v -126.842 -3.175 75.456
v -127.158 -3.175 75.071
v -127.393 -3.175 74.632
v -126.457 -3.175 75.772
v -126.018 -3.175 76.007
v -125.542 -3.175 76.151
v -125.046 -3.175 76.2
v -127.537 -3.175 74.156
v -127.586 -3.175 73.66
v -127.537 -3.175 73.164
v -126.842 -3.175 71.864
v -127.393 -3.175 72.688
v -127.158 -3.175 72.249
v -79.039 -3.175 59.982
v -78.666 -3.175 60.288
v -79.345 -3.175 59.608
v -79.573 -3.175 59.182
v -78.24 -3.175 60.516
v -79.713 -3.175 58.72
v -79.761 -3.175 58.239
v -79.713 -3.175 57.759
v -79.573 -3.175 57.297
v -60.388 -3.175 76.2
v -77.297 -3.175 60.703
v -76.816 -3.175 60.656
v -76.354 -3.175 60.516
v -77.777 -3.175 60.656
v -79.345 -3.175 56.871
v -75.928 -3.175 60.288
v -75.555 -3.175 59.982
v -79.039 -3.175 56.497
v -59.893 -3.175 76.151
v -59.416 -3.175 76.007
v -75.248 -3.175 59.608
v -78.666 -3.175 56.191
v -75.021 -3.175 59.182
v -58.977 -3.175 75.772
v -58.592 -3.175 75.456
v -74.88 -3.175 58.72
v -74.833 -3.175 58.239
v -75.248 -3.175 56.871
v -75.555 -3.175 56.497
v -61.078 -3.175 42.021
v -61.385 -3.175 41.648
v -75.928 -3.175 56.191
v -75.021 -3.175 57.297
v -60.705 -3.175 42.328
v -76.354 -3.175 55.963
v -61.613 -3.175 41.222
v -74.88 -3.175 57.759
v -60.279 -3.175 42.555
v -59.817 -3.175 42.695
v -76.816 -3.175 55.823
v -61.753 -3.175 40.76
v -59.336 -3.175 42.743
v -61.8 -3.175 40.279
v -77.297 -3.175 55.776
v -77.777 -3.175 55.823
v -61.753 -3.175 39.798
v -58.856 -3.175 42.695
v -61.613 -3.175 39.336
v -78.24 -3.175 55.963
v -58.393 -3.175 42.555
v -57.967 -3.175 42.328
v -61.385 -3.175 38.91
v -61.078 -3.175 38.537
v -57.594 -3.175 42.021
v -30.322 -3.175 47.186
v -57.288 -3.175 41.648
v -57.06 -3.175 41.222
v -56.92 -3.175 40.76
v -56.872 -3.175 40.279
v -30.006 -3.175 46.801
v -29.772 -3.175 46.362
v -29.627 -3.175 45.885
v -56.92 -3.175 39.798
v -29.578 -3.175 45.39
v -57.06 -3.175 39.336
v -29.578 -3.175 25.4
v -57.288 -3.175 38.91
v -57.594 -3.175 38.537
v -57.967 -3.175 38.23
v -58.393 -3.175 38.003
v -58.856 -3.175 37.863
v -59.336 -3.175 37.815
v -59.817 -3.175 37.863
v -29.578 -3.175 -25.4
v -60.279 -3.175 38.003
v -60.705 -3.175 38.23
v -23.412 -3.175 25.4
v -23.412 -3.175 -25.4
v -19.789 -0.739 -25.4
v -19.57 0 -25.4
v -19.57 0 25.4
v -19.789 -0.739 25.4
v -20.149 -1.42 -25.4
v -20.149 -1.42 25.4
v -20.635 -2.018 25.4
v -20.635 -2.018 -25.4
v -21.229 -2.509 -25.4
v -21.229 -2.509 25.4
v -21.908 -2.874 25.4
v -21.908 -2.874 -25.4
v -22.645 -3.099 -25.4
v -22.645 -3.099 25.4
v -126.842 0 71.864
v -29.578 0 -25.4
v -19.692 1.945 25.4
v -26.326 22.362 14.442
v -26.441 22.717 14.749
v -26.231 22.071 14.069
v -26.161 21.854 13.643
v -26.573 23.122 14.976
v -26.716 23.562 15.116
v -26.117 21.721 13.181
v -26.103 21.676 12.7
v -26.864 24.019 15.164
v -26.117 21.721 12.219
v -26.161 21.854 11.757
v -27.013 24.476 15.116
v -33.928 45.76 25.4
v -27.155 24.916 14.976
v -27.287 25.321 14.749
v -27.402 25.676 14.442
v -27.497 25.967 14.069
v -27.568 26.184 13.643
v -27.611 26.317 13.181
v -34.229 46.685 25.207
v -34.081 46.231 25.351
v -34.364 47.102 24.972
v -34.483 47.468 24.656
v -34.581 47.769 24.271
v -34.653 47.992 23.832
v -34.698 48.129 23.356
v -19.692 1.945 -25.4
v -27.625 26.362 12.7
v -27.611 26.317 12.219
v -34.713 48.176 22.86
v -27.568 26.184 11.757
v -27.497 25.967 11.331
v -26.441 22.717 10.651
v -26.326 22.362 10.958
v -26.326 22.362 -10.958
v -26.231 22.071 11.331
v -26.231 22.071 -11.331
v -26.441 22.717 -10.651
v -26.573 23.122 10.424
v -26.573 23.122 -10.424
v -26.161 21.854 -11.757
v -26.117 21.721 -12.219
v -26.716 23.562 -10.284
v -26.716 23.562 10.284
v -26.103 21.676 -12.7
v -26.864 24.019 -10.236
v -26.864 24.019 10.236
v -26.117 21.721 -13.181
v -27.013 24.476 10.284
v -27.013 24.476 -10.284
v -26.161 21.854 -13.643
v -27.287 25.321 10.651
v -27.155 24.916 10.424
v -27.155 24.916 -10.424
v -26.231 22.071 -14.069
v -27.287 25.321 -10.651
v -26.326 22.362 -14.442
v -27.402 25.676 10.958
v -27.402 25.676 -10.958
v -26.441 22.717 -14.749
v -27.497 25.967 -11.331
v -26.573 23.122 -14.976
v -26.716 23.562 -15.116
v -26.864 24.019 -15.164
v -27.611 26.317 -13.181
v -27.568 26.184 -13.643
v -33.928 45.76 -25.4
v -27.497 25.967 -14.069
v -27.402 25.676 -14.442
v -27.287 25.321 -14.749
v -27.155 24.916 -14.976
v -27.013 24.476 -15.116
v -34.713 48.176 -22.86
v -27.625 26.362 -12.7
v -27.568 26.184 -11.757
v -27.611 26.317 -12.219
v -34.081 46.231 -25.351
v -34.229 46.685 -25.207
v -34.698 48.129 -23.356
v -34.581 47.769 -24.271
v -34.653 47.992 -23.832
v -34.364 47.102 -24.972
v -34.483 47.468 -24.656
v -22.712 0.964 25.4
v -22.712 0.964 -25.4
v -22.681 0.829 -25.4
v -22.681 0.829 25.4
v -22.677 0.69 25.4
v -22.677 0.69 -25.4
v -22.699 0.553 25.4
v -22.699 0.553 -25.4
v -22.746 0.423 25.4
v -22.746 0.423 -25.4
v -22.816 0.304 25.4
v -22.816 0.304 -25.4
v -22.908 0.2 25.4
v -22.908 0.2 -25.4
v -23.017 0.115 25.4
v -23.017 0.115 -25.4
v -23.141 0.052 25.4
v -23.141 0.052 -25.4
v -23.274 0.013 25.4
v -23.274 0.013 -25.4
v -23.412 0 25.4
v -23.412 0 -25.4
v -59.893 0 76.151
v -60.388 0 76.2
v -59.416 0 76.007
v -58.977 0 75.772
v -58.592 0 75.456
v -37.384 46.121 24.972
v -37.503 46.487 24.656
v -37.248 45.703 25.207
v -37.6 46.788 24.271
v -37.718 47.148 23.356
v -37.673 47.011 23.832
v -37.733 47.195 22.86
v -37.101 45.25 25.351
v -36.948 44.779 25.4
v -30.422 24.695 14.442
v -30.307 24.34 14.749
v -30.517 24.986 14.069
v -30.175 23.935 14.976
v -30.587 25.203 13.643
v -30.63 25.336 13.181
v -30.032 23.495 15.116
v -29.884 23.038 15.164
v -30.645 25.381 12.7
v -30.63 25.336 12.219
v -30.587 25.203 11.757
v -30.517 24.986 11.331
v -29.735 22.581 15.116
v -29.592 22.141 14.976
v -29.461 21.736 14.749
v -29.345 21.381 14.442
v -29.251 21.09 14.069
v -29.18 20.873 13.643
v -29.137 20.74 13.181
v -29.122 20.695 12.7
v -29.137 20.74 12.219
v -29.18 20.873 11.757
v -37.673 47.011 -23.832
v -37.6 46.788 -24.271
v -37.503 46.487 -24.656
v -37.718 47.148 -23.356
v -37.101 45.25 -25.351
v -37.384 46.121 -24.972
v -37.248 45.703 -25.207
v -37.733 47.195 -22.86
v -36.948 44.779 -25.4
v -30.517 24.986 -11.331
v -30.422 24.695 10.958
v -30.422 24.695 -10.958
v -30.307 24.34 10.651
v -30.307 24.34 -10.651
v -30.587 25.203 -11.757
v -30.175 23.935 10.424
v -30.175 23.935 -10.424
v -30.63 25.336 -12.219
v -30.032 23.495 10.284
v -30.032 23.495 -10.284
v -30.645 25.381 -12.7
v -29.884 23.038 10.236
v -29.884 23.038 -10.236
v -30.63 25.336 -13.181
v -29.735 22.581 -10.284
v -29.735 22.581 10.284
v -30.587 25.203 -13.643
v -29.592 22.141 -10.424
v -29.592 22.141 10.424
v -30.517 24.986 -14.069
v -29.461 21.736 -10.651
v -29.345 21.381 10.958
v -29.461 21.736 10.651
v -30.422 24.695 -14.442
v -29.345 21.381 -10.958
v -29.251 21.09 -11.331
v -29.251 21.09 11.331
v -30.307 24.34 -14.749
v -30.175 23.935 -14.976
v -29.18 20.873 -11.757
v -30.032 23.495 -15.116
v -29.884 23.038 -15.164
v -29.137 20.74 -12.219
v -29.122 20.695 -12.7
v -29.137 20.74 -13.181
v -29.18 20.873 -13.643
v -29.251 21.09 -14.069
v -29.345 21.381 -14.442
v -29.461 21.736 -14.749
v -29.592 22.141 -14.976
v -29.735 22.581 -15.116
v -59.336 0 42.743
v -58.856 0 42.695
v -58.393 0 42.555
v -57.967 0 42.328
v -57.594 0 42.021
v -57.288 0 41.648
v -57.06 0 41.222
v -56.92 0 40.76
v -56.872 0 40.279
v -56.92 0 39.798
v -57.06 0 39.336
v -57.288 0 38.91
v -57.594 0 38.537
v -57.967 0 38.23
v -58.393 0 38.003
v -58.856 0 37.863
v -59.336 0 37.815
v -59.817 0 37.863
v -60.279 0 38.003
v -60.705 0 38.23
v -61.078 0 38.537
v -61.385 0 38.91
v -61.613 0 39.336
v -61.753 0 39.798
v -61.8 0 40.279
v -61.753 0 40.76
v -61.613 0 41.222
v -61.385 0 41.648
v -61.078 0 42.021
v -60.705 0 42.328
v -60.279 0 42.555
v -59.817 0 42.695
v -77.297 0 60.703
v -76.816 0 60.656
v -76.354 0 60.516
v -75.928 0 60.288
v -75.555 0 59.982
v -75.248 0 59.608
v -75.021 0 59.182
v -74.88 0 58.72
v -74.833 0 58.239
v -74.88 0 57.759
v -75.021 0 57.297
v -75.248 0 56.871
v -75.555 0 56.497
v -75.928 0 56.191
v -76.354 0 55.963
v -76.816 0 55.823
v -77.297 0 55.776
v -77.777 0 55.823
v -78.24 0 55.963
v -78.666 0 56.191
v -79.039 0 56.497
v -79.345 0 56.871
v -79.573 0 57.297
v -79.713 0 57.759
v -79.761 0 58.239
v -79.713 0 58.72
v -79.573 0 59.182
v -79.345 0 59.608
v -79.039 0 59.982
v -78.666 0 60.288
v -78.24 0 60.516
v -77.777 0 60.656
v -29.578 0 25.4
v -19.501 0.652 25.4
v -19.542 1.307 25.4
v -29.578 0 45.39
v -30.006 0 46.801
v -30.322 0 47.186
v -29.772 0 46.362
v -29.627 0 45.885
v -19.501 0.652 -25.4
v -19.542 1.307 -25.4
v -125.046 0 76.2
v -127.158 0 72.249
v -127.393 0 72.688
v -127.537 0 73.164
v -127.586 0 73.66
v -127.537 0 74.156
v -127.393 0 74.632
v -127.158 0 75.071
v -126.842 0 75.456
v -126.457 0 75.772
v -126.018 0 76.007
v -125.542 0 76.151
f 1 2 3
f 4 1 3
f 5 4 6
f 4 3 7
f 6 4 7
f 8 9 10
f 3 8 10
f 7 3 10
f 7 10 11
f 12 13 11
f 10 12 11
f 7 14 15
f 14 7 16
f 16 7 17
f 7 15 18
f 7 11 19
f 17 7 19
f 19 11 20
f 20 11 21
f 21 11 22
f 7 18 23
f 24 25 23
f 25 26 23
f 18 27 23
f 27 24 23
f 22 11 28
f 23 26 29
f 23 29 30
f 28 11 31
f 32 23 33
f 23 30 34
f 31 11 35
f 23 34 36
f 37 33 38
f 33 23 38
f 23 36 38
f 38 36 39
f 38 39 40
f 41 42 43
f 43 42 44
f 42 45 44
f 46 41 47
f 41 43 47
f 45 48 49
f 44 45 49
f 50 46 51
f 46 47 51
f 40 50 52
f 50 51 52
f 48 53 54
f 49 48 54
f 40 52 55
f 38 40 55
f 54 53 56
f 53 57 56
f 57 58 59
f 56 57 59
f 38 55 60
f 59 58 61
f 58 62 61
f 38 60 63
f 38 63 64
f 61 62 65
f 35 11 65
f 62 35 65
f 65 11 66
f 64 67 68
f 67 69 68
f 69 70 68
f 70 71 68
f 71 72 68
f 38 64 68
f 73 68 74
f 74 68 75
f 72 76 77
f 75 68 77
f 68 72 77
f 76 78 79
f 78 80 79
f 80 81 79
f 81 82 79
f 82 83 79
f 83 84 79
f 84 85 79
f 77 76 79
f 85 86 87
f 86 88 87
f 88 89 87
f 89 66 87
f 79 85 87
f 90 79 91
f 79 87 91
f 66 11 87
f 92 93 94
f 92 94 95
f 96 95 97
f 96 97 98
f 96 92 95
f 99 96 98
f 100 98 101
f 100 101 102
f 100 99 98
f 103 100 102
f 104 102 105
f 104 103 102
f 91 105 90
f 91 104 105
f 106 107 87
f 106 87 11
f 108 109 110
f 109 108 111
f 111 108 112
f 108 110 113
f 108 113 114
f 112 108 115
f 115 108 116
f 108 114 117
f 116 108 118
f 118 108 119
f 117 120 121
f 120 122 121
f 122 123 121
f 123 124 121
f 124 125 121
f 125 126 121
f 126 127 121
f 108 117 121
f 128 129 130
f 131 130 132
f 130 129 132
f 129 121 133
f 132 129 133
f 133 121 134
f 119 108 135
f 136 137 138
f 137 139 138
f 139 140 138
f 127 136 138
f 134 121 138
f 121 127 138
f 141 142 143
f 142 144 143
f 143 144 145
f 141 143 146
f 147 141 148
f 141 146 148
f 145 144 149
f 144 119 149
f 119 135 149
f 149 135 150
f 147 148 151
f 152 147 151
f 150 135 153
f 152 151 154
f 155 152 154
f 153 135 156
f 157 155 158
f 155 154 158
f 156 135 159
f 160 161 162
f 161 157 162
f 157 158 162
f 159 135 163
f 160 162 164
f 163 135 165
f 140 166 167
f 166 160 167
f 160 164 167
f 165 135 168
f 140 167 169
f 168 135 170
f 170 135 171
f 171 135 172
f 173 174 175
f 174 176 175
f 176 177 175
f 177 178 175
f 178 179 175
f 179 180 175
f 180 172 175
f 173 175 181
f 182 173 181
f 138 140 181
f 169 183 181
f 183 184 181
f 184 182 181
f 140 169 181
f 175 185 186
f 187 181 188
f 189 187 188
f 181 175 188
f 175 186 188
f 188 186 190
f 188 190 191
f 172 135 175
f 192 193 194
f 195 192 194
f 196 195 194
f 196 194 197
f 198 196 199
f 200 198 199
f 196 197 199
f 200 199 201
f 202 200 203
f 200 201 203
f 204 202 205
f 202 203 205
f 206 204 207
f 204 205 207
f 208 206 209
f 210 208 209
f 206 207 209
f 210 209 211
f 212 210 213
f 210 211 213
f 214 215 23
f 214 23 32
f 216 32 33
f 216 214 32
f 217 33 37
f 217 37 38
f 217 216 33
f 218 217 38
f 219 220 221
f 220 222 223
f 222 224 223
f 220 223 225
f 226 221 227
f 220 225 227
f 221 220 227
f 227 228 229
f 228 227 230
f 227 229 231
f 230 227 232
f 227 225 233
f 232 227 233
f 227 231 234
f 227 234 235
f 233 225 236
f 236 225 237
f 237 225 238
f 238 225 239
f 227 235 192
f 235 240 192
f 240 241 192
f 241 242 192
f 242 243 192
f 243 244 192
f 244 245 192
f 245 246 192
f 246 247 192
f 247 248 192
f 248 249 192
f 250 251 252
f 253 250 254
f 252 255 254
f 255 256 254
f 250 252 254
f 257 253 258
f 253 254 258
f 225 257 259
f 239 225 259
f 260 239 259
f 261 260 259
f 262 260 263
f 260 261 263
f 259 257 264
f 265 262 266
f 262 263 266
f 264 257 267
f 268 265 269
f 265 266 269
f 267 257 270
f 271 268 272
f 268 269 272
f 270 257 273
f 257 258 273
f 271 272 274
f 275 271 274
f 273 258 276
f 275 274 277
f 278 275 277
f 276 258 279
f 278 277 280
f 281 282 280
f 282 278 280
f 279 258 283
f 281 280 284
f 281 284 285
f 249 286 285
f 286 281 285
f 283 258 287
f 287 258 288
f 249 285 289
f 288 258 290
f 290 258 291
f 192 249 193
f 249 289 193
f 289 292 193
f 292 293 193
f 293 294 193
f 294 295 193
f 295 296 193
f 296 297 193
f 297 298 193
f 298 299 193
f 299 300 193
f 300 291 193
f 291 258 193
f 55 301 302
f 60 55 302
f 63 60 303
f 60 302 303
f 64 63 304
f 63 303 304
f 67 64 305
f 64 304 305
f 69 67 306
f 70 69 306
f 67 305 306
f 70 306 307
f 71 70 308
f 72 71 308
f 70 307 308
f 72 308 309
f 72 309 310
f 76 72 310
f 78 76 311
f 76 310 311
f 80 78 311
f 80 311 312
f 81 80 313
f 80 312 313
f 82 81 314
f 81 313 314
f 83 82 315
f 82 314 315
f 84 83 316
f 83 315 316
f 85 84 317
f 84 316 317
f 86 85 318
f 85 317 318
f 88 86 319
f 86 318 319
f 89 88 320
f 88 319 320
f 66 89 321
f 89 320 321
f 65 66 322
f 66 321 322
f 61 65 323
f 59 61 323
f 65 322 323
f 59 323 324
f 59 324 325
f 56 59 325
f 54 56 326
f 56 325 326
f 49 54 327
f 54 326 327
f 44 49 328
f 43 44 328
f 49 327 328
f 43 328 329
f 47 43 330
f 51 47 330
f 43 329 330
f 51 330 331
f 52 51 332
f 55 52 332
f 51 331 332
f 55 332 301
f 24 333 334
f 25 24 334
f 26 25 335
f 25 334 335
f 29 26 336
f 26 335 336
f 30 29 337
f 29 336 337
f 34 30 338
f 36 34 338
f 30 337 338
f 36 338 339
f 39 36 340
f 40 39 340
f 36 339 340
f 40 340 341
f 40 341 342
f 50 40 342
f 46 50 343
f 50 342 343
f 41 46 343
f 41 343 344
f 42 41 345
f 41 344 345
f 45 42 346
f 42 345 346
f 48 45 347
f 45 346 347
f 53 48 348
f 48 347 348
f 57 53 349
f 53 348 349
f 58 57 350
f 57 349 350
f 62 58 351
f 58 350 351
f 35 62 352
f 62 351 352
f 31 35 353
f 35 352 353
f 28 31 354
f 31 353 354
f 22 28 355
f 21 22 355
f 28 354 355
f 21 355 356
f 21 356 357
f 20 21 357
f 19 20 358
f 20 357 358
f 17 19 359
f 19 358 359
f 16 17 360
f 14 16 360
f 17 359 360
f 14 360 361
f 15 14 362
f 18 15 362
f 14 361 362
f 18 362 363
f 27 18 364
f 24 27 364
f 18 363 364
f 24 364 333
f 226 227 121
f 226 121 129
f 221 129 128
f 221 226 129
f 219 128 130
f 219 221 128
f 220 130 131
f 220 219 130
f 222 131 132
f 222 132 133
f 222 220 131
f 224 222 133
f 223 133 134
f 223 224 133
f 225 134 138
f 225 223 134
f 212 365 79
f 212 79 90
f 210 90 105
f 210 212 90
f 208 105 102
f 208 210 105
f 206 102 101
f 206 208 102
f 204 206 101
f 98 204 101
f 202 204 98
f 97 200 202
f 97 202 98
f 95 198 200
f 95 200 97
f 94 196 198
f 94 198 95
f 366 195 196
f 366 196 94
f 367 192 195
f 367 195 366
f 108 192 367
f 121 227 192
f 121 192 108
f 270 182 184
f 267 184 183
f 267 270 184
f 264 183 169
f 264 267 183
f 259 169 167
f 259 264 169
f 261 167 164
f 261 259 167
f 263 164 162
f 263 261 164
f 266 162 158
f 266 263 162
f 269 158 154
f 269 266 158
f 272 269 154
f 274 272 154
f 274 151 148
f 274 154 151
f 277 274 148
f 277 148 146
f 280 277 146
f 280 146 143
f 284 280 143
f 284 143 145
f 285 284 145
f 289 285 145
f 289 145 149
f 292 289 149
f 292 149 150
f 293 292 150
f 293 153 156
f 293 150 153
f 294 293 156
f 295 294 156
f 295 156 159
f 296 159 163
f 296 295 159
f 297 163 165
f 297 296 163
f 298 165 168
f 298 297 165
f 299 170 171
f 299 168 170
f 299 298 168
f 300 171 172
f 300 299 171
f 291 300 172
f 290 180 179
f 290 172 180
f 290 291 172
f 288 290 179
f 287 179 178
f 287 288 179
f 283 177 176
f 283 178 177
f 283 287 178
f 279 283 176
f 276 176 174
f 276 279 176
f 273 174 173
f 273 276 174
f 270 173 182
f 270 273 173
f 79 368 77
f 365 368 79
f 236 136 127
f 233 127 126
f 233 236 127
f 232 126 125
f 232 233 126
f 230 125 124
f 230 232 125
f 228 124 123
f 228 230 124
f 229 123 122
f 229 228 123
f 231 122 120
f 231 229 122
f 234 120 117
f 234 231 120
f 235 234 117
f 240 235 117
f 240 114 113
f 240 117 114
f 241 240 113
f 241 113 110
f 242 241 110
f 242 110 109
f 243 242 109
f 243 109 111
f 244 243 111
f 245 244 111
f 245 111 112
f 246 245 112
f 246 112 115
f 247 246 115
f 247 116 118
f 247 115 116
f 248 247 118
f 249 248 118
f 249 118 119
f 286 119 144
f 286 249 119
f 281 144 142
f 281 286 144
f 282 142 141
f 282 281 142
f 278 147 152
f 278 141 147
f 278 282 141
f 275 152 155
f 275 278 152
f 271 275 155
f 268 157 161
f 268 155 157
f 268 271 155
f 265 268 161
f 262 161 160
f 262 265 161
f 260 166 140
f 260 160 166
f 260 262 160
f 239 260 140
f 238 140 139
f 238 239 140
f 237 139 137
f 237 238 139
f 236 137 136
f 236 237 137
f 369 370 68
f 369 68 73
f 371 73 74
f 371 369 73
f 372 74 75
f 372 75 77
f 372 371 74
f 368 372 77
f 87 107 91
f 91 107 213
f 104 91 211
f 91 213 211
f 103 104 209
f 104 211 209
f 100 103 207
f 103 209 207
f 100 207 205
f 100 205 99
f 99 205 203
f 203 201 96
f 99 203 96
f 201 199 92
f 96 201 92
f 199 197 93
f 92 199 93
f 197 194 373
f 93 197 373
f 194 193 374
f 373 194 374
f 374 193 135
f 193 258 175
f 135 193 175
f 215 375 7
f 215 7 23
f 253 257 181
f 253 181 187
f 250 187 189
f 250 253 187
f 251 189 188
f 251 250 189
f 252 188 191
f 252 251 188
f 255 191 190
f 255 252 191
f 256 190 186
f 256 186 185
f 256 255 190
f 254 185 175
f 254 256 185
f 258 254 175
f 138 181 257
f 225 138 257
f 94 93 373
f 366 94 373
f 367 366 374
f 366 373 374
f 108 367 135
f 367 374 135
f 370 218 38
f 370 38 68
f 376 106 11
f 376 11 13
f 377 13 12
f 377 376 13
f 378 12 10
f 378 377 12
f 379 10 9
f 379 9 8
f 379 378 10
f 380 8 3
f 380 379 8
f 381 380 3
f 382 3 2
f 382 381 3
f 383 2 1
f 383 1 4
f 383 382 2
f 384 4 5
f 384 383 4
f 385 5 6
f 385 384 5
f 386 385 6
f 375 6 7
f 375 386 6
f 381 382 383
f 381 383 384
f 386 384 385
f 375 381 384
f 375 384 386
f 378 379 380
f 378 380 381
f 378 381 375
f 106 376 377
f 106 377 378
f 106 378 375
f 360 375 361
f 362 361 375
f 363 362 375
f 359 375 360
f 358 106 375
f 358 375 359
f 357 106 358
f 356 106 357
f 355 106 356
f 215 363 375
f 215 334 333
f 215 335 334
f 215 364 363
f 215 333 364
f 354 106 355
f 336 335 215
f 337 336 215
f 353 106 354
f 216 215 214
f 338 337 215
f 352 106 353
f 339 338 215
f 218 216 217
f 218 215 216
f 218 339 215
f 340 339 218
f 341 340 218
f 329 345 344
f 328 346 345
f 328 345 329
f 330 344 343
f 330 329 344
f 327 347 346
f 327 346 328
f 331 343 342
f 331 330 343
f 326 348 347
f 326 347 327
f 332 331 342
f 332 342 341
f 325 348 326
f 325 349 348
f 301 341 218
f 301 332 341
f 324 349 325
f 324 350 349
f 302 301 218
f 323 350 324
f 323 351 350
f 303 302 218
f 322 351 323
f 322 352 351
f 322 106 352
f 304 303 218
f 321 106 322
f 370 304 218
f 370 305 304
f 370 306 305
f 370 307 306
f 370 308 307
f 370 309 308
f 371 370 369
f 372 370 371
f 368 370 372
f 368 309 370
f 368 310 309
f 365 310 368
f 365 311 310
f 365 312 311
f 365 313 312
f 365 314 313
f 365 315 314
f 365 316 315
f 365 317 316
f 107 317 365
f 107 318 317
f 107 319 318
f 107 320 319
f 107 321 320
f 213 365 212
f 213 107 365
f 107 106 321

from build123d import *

# Parameters (mm, degrees)
SKETCH1_R                  = 2.4638
BASE_FLANGE1_DEPTH         = 3.175
SKETCHED_START             = -25.4
SKETCHED_BEND1_DEPTH       = 50.8
SKETCHED_START_2           = -10.2361999
SKETCHED_BEND1_2_DEPTH     = 20.4723998
SKETCHED_START_3           = -22.86
SKETCHED_BEND1_3_DEPTH     = 7.6961999
SKETCHED_START_4           = 15.1638001
SKETCHED_BEND1_4_DEPTH     = 7.6961999
SKETCHED_BEND1_5_DEPTH     = 50.8
SKETCHED_START_5           = -21.302020374
SKETCHED_BEND1_6_OUTLINE_R = 2.4638
SKETCHED_BEND1_6_DEPTH     = 4.302020374


with BuildPart() as part:
    # Base-Flange1: sheet metal written as solids
    # Sketch1 → Base-Flange1 (new body)
    with BuildSketch(Plane(origin=(0, 0, 0), x_dir=(1, 0, 0), z_dir=(0, 1, 0))):
        with BuildLine():
            Line((-29.5783, 25.4), (-126.842248776, -71.863948776))
            ThreePointArc((-126.842248776, -71.863948776), (-127.392851564, -74.632015918), (-125.046197552, -76.2))
            Line((-125.046197552, -76.2), (-60.38835348, -76.2))
            ThreePointArc((-60.38835348, -76.2), (-59.416337562, -76.006654013), (-58.592302256, -75.456051224))
            Line((-58.592302256, -75.456051224), (-30.322248776, -47.185997744))
            ThreePointArc((-30.322248776, -47.185997744), (-29.771645987, -46.361962438), (-29.5783, -45.38994652))
            Line((-29.5783, -45.38994652), (-29.5783, -25.4))
            Line((-29.5783, -25.4), (27.0383, -25.4))
            ThreePointArc((27.0383, -25.4), (28.834351224, -24.656051224), (29.5783, -22.86))
            Line((29.5783, -22.86), (29.5783, 22.86))
            ThreePointArc((29.5783, 22.86), (28.834351224, 24.656051224), (27.0383, 25.4))
            Line((27.0383, 25.4), (-29.5783, 25.4))
        make_face()
        with Locations(Location((-77.296763274, -58.239487758, 0), (0, 0, 270))):
            Circle(SKETCH1_R, mode=Mode.SUBTRACT)
        with Locations(Location((-59.336251031, -40.278975516, 0), (0, 0, 270))):
            Circle(SKETCH1_R, mode=Mode.SUBTRACT)
        with Locations(Location((4.1783, -12.7, 0), (0, 0, 270))):
            Circle(SKETCH1_R, mode=Mode.SUBTRACT)
        with Locations(Location((4.1783, 12.7, 0), (0, 0, 270))):
            Circle(SKETCH1_R, mode=Mode.SUBTRACT)
    extrude(amount=-BASE_FLANGE1_DEPTH)

    # Sketched Bend1: read off the stored shape, not the designer's step
    # Sketched Bend1 outline → Sketched Bend1 (cut)
    with BuildSketch(Plane.XY.offset(SKETCHED_START)):
        with BuildLine():
            Line((29.5783, 0), (-19.570493847, 0))
            ThreePointArc((-19.570493847, 0), (-20.920192704, -2.278520157), (-23.412112646, -3.175))
            Line((-23.412112646, -3.175), (29.5783, -3.175))
            Line((29.5783, -3.175), (29.5783, 0))
        make_face()
    extrude(amount=SKETCHED_BEND1_DEPTH, mode=Mode.SUBTRACT)

    # Sketched Bend1 2 outline → Sketched Bend1 2 (add)
    with BuildSketch(Plane.XY.offset(SKETCHED_START_2)):
        with BuildLine():
            ThreePointArc((-19.570493847, 0), (-19.508115407, 0.98036242), (-19.691959977, 1.945350875))
            Line((-19.691959977, 1.945350875), (-34.713148559, 48.175815683))
            Line((-34.713148559, 48.175815683), (-37.732752998, 47.194686726))
            Line((-37.732752998, 47.194686726), (-22.711564416, 0.964221918))
            ThreePointArc((-22.711564416, 0.964221918), (-22.816190728, 0.303637383), (-23.412112646, 0))
            Line((-23.412112646, 0), (-19.570493847, 0))
        make_face()
    extrude(amount=SKETCHED_BEND1_2_DEPTH)

    # Sketched Bend1 3 outline → Sketched Bend1 3 (add)
    with BuildSketch(Plane.XY.offset(SKETCHED_START_3)):
        with BuildLine():
            ThreePointArc((-19.570493847, 0), (-19.508115407, 0.98036242), (-19.691959977, 1.945350875))
            Line((-19.691959977, 1.945350875), (-34.713148559, 48.175815683))
            Line((-34.713148559, 48.175815683), (-37.732752998, 47.194686726))
            Line((-37.732752998, 47.194686726), (-22.711564416, 0.964221918))
            ThreePointArc((-22.711564416, 0.964221918), (-22.816190728, 0.303637383), (-23.412112646, 0))
            Line((-23.412112646, 0), (-19.570493847, 0))
        make_face()
    extrude(amount=SKETCHED_BEND1_3_DEPTH)

    # Sketched Bend1 4 outline → Sketched Bend1 4 (add)
    with BuildSketch(Plane.XY.offset(SKETCHED_START_4)):
        with BuildLine():
            ThreePointArc((-19.570493847, 0), (-19.508115407, 0.98036242), (-19.691959977, 1.945350875))
            Line((-19.691959977, 1.945350875), (-34.713148559, 48.175815683))
            Line((-34.713148559, 48.175815683), (-37.732752998, 47.194686726))
            Line((-37.732752998, 47.194686726), (-22.711564416, 0.964221918))
            ThreePointArc((-22.711564416, 0.964221918), (-22.816190728, 0.303637383), (-23.412112646, 0))
            Line((-23.412112646, 0), (-19.570493847, 0))
        make_face()
    extrude(amount=SKETCHED_BEND1_4_DEPTH)

    # Sketched Bend1 5 outline → Sketched Bend1 5 (add)
    with BuildSketch(Plane.XY.offset(SKETCHED_START)):
        with BuildLine():
            ThreePointArc((-19.570493847, 0), (-19.508115407, 0.98036242), (-19.691959977, 1.945350875))
            Line((-19.691959977, 1.945350875), (-34.713148559, 48.175815683))
            Line((-34.713148559, 48.175815683), (-37.732752998, 47.194686726))
            Line((-37.732752998, 47.194686726), (-22.711564416, 0.964221918))
            ThreePointArc((-22.711564416, 0.964221918), (-22.816190728, 0.303637383), (-23.412112646, 0))
            Line((-23.412112646, 0), (-19.570493847, 0))
        make_face()
    extrude(amount=SKETCHED_BEND1_5_DEPTH)

    # Sketched Bend1 6 outline → Sketched Bend1 6 (cut)
    with BuildSketch(Plane(origin=(0, 0, 0), x_dir=(-0.30901699437495117, 0.9510565162951524, 0), z_dir=(0.9510565162951524, 0.3090169943749511, 0)).offset(SKETCHED_START_5)):
        with BuildLine():
            Line((56.544876266, -25.4), (56.544876266, -22.86))
            ThreePointArc((56.544876266, -22.86), (55.80092749, -24.656051224), (54.004876266, -25.4))
            Line((54.004876266, -25.4), (56.544876266, -25.4))
        make_face()
        with BuildLine():
            ThreePointArc((54.004876266, 25.4), (55.80092749, 24.656051224), (56.544876266, 22.86))
            Line((56.544876266, 22.86), (56.544876266, 25.4))
            Line((56.544876266, 25.4), (54.004876266, 25.4))
        make_face()
        with Locations((31.144876266, 12.7)):
            Circle(SKETCHED_BEND1_6_OUTLINE_R)
        with Locations((31.144876266, -12.7)):
            Circle(SKETCHED_BEND1_6_OUTLINE_R)
    extrude(amount=SKETCHED_BEND1_6_DEPTH, mode=Mode.SUBTRACT)


solid = part.part
